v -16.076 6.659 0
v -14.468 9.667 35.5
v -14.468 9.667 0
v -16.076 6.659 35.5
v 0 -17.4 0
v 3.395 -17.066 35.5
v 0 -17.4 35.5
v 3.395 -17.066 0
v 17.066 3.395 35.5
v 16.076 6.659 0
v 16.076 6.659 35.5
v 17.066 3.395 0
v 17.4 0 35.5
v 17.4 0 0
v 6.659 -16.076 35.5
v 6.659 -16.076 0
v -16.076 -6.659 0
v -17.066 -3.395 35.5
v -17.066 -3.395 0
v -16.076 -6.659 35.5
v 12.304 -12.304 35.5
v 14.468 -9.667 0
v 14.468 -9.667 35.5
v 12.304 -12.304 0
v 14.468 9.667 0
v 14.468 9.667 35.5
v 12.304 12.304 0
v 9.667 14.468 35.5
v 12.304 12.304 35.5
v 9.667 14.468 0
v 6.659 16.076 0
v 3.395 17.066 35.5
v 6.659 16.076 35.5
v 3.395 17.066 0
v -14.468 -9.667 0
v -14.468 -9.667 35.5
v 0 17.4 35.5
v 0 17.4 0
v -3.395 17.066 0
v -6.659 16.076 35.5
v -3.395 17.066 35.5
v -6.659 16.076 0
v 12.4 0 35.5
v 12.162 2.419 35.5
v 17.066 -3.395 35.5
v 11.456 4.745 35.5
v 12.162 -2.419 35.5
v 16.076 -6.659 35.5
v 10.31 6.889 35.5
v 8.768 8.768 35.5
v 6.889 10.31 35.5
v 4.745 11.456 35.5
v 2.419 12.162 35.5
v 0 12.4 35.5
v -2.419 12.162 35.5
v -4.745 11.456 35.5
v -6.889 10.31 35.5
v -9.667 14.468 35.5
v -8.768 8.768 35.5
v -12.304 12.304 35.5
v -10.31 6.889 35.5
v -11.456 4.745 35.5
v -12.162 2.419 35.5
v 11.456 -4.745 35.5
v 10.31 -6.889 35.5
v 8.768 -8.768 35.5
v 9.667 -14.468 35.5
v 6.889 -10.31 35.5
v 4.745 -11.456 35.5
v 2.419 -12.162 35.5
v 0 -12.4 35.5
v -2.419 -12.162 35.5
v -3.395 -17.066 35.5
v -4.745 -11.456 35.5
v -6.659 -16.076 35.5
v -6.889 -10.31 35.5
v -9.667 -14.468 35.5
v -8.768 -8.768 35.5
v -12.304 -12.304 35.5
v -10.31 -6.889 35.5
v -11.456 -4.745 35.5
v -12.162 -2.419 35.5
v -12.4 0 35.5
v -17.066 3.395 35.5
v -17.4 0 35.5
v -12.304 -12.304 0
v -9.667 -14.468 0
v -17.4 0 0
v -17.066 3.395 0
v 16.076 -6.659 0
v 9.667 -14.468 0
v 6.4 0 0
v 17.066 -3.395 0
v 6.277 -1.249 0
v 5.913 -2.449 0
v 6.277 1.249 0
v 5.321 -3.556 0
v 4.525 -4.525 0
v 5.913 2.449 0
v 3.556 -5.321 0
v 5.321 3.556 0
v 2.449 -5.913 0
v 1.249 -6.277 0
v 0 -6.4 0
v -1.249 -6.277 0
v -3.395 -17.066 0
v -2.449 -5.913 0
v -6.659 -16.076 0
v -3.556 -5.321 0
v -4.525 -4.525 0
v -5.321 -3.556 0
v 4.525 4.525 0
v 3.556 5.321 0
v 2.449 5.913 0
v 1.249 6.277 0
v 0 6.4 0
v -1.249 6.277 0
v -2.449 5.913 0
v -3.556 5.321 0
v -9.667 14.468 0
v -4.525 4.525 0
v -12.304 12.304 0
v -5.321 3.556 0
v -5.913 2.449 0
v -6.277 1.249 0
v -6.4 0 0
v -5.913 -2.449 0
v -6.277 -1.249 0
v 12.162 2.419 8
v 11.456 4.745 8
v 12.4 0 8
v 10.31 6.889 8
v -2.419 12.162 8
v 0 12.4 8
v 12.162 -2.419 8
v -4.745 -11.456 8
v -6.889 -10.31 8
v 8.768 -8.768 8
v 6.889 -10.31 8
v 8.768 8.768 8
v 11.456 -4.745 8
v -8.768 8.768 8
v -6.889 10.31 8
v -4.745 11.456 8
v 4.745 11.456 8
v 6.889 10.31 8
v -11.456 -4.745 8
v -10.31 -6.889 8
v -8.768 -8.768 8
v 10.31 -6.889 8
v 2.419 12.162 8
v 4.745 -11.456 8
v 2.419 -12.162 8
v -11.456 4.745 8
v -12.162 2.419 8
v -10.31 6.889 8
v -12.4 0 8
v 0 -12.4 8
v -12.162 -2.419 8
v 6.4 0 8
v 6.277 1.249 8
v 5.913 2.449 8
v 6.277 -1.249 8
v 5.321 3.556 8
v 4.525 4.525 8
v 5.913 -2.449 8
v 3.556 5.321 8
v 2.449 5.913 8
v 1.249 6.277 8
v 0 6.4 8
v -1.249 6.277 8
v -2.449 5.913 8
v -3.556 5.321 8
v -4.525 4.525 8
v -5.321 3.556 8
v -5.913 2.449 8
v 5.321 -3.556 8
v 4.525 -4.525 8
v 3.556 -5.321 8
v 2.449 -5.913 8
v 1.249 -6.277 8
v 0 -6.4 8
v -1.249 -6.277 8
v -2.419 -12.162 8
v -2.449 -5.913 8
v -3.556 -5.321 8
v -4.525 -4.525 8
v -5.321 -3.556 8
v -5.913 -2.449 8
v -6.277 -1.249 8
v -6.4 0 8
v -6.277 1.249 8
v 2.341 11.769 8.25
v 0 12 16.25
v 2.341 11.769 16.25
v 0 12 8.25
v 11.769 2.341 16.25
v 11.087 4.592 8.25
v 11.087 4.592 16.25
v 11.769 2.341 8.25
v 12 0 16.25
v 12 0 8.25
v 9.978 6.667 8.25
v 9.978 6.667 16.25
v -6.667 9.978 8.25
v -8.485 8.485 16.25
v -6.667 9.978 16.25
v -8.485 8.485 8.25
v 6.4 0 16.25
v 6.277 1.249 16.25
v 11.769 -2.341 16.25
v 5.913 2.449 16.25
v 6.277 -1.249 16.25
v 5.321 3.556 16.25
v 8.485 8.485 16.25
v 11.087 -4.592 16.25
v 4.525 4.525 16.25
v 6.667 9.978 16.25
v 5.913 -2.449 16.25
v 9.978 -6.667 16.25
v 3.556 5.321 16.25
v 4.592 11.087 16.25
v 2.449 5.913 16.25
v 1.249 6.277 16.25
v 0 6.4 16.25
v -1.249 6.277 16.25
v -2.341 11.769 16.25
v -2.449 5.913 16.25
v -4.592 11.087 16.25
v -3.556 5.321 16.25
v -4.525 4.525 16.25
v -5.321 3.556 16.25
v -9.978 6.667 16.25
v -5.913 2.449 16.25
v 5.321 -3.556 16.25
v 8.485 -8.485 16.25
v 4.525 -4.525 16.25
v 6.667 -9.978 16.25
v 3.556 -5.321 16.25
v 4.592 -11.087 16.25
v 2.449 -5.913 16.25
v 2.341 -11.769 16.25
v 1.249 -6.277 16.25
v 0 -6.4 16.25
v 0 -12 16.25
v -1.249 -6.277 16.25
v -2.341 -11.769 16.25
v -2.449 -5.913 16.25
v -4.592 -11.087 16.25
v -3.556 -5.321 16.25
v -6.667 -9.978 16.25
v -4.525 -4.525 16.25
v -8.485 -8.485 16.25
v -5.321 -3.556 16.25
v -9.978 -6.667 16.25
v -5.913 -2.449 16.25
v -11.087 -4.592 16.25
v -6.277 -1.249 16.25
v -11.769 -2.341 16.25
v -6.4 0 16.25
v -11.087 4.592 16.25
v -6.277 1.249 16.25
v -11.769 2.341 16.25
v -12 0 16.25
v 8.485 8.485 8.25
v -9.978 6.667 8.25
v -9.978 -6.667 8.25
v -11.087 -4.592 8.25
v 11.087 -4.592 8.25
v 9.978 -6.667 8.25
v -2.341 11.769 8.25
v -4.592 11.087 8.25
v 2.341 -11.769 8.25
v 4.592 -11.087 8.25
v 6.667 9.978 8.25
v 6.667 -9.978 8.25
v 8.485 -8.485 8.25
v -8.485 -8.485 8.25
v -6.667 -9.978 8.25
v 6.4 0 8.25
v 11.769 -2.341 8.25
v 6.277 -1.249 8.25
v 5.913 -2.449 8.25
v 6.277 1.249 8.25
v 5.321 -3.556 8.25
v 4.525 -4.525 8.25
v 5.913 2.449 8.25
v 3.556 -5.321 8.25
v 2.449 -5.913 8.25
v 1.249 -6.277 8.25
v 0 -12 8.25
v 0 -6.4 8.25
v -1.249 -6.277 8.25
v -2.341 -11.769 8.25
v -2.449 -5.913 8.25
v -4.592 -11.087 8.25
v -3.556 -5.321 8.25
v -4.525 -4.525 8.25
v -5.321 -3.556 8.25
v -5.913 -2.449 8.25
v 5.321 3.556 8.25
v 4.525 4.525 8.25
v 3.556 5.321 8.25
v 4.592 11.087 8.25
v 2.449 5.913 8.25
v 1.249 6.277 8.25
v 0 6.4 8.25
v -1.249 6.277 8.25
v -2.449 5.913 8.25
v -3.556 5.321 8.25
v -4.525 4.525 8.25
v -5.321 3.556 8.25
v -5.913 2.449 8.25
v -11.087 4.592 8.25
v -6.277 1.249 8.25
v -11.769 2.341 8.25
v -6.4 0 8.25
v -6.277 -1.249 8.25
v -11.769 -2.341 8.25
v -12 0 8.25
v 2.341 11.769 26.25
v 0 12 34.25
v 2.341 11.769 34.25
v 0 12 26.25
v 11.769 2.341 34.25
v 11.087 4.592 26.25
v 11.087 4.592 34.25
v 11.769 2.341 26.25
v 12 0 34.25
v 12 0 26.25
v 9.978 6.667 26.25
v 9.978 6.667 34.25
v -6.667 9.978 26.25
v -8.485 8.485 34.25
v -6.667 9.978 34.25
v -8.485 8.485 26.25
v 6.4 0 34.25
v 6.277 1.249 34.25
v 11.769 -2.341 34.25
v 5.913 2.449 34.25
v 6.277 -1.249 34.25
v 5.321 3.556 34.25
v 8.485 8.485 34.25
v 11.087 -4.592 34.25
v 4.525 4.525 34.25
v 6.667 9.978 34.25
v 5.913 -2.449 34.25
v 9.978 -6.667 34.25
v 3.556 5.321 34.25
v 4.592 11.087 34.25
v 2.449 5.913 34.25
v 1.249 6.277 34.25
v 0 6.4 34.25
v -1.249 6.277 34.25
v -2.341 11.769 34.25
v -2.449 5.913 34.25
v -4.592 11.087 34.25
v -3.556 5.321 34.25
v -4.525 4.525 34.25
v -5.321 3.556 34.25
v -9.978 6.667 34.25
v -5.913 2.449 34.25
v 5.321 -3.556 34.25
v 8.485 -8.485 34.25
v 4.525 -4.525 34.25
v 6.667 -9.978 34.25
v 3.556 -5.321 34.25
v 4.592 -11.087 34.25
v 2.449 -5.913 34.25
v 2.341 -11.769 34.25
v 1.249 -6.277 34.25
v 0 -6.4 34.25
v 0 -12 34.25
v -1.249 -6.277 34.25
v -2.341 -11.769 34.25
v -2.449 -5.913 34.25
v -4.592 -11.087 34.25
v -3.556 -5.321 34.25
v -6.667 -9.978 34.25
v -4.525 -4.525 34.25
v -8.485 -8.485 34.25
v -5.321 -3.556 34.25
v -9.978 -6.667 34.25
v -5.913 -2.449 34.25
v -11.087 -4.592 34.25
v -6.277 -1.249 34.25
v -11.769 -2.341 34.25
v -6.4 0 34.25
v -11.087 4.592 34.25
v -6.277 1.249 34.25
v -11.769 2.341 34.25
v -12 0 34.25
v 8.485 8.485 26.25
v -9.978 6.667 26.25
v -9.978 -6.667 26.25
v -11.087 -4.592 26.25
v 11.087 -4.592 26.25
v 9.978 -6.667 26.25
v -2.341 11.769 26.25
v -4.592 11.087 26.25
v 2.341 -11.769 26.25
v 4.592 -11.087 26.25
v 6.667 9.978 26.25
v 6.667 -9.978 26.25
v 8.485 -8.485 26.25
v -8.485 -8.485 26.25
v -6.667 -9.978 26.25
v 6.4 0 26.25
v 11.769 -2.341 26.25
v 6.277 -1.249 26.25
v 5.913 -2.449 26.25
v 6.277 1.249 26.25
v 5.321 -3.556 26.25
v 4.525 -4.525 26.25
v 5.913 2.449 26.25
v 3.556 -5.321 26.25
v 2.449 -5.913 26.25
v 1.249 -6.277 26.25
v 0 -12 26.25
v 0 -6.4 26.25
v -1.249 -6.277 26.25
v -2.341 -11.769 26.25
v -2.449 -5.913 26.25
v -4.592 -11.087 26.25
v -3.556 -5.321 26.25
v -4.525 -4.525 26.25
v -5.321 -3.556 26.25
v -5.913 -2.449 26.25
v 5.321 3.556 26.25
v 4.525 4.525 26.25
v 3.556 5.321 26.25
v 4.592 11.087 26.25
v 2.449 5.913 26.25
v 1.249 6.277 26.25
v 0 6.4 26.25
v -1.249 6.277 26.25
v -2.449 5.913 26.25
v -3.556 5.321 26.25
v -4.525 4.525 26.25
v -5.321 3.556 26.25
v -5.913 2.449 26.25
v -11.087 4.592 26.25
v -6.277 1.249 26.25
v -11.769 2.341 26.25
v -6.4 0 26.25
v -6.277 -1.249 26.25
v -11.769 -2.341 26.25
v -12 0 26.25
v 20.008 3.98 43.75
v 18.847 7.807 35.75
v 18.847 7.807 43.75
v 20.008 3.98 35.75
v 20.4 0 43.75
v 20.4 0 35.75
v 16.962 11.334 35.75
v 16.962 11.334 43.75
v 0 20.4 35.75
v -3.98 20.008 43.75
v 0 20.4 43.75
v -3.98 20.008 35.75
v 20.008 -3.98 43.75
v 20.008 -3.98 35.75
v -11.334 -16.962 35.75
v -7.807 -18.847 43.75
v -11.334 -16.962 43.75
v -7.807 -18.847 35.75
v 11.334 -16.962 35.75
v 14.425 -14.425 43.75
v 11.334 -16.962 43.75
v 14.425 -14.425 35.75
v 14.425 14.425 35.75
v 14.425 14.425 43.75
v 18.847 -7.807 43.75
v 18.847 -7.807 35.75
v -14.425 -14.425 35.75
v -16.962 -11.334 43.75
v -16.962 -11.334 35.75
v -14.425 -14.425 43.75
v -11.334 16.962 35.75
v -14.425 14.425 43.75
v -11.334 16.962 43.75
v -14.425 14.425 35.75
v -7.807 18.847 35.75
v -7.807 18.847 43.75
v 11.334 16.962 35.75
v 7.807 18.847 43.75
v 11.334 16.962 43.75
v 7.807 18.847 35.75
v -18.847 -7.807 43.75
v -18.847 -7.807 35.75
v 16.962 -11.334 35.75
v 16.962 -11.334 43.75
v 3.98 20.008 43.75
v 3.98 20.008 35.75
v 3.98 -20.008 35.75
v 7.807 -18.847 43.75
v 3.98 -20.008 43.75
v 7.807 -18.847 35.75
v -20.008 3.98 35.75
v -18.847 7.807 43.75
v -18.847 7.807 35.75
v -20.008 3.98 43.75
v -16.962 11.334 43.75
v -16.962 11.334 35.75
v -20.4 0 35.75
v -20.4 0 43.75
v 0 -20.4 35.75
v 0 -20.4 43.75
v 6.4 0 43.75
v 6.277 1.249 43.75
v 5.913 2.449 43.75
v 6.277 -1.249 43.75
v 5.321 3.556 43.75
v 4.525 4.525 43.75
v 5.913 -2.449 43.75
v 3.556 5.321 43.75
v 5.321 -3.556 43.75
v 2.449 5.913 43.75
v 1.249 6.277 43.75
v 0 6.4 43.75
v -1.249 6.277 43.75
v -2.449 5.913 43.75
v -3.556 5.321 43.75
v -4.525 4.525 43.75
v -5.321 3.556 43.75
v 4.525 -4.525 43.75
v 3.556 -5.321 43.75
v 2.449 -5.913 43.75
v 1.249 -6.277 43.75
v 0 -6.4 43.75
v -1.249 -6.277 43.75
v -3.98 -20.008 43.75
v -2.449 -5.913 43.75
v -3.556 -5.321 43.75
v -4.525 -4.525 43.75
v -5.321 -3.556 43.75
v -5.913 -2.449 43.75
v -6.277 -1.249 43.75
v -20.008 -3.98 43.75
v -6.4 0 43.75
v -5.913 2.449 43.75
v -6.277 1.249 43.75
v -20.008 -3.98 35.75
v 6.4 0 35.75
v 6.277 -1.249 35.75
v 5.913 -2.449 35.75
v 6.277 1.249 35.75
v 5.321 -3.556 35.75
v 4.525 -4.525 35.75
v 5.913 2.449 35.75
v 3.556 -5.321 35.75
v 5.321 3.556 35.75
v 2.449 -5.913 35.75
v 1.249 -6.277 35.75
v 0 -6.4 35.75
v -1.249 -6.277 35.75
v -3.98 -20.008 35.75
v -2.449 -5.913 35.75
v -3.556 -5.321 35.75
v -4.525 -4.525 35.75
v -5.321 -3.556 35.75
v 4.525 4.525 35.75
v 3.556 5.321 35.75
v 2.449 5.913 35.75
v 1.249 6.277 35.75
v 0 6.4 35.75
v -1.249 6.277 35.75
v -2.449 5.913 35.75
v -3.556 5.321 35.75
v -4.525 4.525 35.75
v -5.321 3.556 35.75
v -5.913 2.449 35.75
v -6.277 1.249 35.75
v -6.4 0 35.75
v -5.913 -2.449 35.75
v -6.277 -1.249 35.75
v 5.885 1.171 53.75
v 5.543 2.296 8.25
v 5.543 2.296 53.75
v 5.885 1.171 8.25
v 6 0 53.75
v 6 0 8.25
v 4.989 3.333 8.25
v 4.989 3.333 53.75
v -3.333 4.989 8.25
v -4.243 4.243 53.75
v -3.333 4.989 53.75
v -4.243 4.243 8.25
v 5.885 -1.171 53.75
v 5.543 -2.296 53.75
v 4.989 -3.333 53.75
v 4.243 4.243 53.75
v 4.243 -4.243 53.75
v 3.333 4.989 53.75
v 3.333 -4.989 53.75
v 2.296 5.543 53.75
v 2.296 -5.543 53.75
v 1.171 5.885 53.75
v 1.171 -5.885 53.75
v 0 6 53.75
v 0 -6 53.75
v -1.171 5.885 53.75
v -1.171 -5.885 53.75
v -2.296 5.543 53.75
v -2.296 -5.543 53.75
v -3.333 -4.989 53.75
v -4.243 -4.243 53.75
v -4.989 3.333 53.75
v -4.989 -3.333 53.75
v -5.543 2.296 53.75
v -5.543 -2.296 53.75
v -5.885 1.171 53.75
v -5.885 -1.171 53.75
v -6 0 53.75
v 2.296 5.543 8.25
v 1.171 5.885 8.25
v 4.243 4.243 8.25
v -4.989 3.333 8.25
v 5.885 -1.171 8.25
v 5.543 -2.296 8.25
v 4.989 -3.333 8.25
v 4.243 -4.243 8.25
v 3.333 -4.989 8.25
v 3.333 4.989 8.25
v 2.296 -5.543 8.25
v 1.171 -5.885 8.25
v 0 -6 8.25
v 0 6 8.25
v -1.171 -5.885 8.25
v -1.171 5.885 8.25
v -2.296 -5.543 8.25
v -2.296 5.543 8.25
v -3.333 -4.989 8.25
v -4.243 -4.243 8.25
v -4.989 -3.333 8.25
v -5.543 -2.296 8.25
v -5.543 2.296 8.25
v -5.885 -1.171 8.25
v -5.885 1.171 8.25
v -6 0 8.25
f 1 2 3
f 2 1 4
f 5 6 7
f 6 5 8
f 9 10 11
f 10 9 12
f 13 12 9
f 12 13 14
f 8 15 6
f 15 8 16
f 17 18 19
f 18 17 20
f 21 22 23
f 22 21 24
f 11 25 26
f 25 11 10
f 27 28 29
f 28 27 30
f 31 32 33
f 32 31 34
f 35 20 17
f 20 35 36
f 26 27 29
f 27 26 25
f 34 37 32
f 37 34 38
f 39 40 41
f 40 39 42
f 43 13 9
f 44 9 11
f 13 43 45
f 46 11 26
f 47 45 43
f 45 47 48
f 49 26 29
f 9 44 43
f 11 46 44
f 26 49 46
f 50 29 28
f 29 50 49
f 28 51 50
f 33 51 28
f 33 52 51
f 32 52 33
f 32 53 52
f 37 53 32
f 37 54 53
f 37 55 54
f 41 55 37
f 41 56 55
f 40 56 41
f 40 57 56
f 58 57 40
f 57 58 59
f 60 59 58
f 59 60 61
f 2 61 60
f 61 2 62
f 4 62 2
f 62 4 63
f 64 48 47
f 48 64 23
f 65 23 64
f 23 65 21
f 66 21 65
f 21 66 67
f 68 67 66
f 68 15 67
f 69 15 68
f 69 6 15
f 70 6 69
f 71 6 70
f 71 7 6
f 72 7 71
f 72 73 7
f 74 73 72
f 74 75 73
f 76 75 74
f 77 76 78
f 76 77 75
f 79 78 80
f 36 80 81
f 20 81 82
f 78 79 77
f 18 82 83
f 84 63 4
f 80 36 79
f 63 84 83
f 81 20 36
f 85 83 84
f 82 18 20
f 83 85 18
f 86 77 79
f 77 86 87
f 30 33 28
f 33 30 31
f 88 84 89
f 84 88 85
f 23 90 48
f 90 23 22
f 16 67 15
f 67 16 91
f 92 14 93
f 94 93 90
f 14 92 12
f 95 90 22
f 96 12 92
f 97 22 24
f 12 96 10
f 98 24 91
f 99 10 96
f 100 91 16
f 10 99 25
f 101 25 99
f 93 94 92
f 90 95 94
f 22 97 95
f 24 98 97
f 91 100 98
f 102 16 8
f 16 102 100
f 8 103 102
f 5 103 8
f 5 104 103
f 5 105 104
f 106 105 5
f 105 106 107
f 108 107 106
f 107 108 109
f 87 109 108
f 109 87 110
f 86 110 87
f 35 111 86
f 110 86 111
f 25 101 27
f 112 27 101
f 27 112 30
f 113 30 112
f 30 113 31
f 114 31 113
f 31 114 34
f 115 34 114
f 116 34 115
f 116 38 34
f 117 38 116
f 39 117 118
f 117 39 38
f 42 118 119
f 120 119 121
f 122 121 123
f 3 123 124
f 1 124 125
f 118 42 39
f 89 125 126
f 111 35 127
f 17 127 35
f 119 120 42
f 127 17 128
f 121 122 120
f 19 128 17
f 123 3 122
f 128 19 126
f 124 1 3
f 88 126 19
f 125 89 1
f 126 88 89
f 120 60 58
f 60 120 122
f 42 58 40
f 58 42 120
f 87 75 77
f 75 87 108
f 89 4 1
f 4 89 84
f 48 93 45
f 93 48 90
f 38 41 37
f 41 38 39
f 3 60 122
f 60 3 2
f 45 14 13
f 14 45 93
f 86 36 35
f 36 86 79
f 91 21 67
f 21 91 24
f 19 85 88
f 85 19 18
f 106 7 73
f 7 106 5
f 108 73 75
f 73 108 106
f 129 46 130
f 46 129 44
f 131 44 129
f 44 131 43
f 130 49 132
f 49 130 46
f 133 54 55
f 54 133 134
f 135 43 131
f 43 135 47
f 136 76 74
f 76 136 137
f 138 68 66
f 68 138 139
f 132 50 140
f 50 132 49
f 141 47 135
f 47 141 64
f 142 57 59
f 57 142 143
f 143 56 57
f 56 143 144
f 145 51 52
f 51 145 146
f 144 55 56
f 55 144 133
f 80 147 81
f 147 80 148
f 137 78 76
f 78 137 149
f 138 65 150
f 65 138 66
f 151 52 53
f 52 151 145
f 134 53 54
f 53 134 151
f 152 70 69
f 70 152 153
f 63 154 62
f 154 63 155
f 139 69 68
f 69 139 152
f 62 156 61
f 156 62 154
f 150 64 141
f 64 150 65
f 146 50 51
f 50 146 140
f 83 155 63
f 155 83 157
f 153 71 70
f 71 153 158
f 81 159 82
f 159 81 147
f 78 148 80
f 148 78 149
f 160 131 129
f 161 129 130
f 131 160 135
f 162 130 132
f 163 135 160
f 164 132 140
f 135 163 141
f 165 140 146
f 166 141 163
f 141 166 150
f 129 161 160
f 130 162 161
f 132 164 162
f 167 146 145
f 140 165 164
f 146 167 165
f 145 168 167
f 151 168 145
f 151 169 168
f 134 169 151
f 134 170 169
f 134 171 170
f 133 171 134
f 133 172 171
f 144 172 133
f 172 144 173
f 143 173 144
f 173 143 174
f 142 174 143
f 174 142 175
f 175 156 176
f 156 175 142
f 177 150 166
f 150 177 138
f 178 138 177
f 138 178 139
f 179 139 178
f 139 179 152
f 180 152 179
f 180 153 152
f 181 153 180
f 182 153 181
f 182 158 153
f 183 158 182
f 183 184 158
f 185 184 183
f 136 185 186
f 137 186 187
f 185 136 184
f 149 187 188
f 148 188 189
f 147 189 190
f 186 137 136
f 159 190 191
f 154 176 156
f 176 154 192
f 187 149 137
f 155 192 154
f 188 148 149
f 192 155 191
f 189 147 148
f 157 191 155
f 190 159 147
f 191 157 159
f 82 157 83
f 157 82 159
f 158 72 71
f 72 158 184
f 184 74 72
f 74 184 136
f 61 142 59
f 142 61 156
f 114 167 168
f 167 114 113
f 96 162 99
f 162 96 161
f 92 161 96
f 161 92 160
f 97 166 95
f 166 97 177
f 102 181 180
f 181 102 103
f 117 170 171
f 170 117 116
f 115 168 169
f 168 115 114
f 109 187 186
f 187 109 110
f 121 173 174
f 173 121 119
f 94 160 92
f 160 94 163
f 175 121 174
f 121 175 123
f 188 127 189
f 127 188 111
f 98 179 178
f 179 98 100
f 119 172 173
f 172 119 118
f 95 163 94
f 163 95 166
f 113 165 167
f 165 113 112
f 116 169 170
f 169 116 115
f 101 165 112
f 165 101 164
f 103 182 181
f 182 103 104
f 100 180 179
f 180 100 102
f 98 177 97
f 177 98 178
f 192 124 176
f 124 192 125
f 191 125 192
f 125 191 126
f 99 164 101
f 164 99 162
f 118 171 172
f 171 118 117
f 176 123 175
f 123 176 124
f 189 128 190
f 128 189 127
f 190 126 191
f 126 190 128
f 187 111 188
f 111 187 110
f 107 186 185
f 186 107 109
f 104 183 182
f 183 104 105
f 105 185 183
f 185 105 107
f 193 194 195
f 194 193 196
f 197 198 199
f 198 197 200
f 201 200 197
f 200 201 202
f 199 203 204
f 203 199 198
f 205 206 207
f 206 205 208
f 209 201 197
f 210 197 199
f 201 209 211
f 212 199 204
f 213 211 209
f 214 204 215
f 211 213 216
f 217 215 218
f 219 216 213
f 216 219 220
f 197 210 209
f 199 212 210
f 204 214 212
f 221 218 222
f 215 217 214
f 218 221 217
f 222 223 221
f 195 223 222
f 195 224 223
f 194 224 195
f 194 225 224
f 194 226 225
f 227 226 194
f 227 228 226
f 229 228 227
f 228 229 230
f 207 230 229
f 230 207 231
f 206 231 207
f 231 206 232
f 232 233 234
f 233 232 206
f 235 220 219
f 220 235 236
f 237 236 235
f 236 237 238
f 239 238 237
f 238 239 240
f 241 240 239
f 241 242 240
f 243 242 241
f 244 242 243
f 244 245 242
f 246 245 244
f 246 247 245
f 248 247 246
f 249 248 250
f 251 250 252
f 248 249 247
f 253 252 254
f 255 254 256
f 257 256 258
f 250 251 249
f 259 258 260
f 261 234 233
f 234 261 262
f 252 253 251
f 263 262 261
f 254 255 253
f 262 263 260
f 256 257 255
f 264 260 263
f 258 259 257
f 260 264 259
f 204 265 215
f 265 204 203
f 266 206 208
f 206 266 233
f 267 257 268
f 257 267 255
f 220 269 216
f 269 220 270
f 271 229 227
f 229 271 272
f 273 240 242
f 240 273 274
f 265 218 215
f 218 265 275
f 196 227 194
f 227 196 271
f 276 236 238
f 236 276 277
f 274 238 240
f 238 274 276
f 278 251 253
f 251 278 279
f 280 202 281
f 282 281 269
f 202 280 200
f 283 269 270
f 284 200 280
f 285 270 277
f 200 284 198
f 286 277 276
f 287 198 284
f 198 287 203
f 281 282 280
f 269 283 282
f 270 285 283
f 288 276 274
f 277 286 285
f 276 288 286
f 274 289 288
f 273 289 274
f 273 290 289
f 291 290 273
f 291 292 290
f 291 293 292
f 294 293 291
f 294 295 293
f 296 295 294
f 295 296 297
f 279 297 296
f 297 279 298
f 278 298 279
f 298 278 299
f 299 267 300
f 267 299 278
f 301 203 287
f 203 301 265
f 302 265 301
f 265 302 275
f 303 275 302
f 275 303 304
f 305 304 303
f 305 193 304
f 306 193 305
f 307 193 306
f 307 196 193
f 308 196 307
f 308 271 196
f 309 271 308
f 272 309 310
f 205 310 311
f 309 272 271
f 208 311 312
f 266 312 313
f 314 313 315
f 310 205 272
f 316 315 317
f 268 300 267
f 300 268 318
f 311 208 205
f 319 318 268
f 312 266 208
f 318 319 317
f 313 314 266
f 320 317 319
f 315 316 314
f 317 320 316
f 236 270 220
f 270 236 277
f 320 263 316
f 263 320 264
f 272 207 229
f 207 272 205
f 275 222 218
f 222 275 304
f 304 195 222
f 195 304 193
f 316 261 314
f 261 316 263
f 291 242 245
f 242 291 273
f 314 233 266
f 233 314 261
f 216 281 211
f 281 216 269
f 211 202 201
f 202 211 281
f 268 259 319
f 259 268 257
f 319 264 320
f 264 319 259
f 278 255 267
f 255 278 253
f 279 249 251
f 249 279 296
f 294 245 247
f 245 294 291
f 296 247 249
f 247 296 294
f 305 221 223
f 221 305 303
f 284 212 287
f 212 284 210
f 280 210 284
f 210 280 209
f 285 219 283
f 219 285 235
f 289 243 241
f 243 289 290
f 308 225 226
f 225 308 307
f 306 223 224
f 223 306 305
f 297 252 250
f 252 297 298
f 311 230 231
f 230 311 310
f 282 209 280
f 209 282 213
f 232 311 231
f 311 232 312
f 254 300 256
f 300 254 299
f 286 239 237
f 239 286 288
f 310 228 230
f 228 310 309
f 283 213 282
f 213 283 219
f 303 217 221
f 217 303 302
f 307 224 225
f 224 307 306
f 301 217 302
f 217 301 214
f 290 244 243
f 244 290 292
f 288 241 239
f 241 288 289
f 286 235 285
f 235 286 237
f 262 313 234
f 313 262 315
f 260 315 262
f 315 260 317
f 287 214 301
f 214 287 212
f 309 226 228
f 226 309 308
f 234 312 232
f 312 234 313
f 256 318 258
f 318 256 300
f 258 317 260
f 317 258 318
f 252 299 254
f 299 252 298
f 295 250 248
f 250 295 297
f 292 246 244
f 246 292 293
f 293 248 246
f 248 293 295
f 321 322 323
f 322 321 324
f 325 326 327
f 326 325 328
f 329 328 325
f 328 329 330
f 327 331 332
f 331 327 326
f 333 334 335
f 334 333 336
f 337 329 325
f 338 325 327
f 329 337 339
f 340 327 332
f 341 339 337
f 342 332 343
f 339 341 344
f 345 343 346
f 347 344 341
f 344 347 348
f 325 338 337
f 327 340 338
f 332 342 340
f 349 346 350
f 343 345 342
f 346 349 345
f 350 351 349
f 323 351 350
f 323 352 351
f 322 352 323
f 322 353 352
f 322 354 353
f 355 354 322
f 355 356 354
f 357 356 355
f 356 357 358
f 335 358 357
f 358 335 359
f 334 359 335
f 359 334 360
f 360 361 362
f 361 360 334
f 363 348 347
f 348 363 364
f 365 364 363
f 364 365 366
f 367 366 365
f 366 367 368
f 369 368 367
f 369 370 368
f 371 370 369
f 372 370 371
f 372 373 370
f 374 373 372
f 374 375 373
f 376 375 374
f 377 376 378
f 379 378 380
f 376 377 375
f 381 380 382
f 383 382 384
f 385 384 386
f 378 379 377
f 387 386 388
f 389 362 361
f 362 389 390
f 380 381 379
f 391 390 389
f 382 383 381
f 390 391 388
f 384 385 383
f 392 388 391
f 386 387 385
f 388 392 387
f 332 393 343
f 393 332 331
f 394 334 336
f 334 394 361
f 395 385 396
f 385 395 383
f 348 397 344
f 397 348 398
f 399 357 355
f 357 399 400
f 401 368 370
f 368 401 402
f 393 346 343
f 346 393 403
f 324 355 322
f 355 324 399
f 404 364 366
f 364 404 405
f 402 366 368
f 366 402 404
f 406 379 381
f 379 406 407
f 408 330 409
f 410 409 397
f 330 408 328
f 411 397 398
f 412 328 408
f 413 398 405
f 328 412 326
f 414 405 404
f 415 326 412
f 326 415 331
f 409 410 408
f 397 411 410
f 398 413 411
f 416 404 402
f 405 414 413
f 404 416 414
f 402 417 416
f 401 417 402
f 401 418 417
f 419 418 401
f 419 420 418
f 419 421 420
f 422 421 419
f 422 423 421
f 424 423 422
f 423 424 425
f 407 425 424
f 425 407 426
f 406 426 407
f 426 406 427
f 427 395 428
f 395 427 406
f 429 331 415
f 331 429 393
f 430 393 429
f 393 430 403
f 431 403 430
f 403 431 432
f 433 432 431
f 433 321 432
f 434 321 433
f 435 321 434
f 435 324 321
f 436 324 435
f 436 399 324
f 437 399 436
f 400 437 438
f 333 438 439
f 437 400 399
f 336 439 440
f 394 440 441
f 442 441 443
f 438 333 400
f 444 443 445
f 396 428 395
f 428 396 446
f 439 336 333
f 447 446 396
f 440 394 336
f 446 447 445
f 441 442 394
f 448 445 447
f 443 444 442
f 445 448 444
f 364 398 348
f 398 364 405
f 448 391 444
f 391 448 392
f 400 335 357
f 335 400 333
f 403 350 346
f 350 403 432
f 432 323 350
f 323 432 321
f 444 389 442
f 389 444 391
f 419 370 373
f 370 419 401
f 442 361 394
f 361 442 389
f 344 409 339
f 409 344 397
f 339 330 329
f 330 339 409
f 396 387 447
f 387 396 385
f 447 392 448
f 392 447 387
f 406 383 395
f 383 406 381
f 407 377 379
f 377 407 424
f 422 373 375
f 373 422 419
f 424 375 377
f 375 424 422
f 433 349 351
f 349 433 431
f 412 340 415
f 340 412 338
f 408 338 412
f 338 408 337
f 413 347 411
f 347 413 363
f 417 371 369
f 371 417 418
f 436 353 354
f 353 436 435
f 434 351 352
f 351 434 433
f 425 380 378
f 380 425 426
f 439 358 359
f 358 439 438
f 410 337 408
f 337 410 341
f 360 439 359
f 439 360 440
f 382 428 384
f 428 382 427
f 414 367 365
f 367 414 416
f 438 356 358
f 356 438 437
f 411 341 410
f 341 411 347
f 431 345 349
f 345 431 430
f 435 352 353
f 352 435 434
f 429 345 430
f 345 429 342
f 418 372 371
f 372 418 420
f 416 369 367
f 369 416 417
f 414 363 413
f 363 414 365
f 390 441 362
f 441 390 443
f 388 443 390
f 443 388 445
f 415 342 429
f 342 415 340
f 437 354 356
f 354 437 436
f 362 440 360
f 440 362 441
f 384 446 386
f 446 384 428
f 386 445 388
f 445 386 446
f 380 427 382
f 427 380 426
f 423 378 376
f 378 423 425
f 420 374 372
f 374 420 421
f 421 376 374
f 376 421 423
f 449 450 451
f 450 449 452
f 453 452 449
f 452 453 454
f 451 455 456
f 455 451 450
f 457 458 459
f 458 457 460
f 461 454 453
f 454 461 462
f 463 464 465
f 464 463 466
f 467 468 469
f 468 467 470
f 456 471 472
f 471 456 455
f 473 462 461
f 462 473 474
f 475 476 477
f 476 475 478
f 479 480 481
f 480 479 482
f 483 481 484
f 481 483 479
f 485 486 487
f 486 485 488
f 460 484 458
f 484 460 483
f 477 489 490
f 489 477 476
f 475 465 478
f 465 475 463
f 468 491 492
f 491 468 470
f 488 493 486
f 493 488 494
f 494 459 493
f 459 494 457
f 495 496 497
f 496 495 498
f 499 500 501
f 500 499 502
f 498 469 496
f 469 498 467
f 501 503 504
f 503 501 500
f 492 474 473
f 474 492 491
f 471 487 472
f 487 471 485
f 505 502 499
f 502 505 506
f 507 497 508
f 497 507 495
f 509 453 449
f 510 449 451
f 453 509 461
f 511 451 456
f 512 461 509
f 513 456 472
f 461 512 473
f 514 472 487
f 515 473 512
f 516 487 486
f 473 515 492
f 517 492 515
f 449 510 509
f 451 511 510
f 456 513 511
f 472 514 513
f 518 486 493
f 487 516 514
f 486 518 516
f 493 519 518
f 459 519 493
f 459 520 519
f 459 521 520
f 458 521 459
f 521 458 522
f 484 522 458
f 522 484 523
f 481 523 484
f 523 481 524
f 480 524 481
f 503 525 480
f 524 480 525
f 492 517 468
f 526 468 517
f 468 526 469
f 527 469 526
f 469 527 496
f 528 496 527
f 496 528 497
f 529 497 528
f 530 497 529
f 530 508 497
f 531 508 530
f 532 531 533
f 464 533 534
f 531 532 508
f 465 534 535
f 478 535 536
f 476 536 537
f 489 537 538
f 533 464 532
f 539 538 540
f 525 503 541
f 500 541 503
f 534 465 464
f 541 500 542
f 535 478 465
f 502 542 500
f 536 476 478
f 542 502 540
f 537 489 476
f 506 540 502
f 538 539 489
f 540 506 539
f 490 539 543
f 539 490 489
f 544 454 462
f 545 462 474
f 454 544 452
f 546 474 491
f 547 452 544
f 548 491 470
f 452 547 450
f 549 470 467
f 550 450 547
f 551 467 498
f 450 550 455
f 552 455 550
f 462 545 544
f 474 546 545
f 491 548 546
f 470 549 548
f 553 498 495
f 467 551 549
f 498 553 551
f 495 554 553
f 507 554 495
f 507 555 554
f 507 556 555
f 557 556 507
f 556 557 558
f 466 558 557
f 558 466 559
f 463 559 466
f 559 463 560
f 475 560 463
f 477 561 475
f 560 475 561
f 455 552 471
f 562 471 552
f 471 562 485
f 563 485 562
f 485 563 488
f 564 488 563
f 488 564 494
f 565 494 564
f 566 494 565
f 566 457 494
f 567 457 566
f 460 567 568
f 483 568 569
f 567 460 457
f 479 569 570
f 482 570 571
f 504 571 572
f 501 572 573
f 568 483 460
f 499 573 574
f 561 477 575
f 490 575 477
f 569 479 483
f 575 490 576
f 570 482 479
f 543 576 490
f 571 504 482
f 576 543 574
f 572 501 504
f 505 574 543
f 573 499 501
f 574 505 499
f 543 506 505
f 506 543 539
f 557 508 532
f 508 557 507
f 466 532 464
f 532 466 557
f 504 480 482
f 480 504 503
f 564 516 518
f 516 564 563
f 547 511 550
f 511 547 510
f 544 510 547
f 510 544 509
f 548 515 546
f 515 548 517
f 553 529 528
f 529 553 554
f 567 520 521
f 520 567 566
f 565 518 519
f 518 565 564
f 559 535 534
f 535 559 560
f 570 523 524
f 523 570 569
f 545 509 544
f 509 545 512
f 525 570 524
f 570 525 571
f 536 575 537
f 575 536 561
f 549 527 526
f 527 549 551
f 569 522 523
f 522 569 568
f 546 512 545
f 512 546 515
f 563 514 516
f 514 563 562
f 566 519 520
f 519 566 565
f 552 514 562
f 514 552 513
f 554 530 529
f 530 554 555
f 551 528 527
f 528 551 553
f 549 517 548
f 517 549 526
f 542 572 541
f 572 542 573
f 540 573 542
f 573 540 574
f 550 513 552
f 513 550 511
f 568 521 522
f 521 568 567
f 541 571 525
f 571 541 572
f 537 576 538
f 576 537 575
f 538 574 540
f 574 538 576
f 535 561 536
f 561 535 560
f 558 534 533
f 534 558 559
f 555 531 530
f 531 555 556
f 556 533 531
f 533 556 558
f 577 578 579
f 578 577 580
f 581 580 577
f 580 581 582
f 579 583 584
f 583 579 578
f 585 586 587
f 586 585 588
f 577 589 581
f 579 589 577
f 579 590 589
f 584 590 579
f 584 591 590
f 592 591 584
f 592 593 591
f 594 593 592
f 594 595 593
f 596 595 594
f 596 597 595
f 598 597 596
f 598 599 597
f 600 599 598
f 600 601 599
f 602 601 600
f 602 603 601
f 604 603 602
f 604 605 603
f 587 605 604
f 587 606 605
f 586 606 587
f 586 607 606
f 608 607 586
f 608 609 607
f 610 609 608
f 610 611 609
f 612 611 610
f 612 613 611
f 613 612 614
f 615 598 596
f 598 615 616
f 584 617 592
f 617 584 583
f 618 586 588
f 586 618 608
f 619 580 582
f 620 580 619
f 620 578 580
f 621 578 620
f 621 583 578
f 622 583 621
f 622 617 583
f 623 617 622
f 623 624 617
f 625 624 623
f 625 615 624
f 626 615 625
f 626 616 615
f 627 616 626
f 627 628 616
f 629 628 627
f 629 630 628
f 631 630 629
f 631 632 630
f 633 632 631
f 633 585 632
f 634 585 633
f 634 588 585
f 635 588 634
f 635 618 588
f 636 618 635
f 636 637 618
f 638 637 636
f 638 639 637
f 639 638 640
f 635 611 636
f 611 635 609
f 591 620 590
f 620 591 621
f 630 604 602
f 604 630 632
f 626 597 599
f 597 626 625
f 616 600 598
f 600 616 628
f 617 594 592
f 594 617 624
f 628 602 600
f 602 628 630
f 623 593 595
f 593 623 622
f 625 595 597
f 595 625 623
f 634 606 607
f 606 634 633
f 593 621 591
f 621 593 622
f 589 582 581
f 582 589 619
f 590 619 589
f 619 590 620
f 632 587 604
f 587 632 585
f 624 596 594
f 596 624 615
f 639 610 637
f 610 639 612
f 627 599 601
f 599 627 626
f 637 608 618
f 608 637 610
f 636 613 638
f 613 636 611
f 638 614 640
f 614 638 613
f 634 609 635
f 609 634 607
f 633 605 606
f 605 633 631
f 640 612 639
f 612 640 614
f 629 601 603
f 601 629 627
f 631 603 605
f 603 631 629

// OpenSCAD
$fn = 32;

// ------------------------------------------------------------------------
// Shaft station: cup d34.8 x 35.5 mm, shaft d12
// Every part is its own module, assembly() places every instance.
// ------------------------------------------------------------------------

// --- part 1 ---
module housing_cup() {
  difference() {
    cylinder(h = 35.5, d = 34.8);
    translate([0, 0, 8]) cylinder(h = 28.5, d = 24.8);
    translate([0, 0, -1]) cylinder(h = 10, d = 12.8);
  }
}

// --- part 2 ---
module bearing_lower() {
  difference() {
      translate([0, 0, 0]) cylinder(h = 8, d = 24);
      translate([0, 0, -1]) cylinder(h = 10, d = 12.8);
    }
}

// --- part 3 ---
module bearing_upper() {
  difference() {
      translate([0, 0, 0]) cylinder(h = 8, d = 24);
      translate([0, 0, -1]) cylinder(h = 10, d = 12.8);
    }
}

// --- part 4 ---
module station_shaft() {
  translate([0, 0, -22.75]) cylinder(h = 45.5, d = 12);
}

// --- part 5 ---
module station_cover() {
  difference() {
    cylinder(h = 8, d = 40.8);
    translate([0, 0, -1]) cylinder(h = 10, d = 12.8);
  }
}

// --- assembly ---
module assembly() {
  color([0.80, 0.24, 0.20]) translate([0, 0, 0]) rotate([0, 0, 0]) housing_cup();
  color([0.20, 0.45, 0.75]) translate([0, 0, 8.25]) rotate([0, 0, 0]) bearing_lower();
  color([0.25, 0.62, 0.32]) translate([0, 0, 26.25]) rotate([0, 0, 0]) bearing_upper();
  color([0.92, 0.70, 0.18]) translate([0, 0, 31]) rotate([0, 0, 0]) station_shaft();
  color([0.58, 0.35, 0.70]) translate([0, 0, 35.75]) rotate([0, 0, 0]) station_cover();
}

assembly();
